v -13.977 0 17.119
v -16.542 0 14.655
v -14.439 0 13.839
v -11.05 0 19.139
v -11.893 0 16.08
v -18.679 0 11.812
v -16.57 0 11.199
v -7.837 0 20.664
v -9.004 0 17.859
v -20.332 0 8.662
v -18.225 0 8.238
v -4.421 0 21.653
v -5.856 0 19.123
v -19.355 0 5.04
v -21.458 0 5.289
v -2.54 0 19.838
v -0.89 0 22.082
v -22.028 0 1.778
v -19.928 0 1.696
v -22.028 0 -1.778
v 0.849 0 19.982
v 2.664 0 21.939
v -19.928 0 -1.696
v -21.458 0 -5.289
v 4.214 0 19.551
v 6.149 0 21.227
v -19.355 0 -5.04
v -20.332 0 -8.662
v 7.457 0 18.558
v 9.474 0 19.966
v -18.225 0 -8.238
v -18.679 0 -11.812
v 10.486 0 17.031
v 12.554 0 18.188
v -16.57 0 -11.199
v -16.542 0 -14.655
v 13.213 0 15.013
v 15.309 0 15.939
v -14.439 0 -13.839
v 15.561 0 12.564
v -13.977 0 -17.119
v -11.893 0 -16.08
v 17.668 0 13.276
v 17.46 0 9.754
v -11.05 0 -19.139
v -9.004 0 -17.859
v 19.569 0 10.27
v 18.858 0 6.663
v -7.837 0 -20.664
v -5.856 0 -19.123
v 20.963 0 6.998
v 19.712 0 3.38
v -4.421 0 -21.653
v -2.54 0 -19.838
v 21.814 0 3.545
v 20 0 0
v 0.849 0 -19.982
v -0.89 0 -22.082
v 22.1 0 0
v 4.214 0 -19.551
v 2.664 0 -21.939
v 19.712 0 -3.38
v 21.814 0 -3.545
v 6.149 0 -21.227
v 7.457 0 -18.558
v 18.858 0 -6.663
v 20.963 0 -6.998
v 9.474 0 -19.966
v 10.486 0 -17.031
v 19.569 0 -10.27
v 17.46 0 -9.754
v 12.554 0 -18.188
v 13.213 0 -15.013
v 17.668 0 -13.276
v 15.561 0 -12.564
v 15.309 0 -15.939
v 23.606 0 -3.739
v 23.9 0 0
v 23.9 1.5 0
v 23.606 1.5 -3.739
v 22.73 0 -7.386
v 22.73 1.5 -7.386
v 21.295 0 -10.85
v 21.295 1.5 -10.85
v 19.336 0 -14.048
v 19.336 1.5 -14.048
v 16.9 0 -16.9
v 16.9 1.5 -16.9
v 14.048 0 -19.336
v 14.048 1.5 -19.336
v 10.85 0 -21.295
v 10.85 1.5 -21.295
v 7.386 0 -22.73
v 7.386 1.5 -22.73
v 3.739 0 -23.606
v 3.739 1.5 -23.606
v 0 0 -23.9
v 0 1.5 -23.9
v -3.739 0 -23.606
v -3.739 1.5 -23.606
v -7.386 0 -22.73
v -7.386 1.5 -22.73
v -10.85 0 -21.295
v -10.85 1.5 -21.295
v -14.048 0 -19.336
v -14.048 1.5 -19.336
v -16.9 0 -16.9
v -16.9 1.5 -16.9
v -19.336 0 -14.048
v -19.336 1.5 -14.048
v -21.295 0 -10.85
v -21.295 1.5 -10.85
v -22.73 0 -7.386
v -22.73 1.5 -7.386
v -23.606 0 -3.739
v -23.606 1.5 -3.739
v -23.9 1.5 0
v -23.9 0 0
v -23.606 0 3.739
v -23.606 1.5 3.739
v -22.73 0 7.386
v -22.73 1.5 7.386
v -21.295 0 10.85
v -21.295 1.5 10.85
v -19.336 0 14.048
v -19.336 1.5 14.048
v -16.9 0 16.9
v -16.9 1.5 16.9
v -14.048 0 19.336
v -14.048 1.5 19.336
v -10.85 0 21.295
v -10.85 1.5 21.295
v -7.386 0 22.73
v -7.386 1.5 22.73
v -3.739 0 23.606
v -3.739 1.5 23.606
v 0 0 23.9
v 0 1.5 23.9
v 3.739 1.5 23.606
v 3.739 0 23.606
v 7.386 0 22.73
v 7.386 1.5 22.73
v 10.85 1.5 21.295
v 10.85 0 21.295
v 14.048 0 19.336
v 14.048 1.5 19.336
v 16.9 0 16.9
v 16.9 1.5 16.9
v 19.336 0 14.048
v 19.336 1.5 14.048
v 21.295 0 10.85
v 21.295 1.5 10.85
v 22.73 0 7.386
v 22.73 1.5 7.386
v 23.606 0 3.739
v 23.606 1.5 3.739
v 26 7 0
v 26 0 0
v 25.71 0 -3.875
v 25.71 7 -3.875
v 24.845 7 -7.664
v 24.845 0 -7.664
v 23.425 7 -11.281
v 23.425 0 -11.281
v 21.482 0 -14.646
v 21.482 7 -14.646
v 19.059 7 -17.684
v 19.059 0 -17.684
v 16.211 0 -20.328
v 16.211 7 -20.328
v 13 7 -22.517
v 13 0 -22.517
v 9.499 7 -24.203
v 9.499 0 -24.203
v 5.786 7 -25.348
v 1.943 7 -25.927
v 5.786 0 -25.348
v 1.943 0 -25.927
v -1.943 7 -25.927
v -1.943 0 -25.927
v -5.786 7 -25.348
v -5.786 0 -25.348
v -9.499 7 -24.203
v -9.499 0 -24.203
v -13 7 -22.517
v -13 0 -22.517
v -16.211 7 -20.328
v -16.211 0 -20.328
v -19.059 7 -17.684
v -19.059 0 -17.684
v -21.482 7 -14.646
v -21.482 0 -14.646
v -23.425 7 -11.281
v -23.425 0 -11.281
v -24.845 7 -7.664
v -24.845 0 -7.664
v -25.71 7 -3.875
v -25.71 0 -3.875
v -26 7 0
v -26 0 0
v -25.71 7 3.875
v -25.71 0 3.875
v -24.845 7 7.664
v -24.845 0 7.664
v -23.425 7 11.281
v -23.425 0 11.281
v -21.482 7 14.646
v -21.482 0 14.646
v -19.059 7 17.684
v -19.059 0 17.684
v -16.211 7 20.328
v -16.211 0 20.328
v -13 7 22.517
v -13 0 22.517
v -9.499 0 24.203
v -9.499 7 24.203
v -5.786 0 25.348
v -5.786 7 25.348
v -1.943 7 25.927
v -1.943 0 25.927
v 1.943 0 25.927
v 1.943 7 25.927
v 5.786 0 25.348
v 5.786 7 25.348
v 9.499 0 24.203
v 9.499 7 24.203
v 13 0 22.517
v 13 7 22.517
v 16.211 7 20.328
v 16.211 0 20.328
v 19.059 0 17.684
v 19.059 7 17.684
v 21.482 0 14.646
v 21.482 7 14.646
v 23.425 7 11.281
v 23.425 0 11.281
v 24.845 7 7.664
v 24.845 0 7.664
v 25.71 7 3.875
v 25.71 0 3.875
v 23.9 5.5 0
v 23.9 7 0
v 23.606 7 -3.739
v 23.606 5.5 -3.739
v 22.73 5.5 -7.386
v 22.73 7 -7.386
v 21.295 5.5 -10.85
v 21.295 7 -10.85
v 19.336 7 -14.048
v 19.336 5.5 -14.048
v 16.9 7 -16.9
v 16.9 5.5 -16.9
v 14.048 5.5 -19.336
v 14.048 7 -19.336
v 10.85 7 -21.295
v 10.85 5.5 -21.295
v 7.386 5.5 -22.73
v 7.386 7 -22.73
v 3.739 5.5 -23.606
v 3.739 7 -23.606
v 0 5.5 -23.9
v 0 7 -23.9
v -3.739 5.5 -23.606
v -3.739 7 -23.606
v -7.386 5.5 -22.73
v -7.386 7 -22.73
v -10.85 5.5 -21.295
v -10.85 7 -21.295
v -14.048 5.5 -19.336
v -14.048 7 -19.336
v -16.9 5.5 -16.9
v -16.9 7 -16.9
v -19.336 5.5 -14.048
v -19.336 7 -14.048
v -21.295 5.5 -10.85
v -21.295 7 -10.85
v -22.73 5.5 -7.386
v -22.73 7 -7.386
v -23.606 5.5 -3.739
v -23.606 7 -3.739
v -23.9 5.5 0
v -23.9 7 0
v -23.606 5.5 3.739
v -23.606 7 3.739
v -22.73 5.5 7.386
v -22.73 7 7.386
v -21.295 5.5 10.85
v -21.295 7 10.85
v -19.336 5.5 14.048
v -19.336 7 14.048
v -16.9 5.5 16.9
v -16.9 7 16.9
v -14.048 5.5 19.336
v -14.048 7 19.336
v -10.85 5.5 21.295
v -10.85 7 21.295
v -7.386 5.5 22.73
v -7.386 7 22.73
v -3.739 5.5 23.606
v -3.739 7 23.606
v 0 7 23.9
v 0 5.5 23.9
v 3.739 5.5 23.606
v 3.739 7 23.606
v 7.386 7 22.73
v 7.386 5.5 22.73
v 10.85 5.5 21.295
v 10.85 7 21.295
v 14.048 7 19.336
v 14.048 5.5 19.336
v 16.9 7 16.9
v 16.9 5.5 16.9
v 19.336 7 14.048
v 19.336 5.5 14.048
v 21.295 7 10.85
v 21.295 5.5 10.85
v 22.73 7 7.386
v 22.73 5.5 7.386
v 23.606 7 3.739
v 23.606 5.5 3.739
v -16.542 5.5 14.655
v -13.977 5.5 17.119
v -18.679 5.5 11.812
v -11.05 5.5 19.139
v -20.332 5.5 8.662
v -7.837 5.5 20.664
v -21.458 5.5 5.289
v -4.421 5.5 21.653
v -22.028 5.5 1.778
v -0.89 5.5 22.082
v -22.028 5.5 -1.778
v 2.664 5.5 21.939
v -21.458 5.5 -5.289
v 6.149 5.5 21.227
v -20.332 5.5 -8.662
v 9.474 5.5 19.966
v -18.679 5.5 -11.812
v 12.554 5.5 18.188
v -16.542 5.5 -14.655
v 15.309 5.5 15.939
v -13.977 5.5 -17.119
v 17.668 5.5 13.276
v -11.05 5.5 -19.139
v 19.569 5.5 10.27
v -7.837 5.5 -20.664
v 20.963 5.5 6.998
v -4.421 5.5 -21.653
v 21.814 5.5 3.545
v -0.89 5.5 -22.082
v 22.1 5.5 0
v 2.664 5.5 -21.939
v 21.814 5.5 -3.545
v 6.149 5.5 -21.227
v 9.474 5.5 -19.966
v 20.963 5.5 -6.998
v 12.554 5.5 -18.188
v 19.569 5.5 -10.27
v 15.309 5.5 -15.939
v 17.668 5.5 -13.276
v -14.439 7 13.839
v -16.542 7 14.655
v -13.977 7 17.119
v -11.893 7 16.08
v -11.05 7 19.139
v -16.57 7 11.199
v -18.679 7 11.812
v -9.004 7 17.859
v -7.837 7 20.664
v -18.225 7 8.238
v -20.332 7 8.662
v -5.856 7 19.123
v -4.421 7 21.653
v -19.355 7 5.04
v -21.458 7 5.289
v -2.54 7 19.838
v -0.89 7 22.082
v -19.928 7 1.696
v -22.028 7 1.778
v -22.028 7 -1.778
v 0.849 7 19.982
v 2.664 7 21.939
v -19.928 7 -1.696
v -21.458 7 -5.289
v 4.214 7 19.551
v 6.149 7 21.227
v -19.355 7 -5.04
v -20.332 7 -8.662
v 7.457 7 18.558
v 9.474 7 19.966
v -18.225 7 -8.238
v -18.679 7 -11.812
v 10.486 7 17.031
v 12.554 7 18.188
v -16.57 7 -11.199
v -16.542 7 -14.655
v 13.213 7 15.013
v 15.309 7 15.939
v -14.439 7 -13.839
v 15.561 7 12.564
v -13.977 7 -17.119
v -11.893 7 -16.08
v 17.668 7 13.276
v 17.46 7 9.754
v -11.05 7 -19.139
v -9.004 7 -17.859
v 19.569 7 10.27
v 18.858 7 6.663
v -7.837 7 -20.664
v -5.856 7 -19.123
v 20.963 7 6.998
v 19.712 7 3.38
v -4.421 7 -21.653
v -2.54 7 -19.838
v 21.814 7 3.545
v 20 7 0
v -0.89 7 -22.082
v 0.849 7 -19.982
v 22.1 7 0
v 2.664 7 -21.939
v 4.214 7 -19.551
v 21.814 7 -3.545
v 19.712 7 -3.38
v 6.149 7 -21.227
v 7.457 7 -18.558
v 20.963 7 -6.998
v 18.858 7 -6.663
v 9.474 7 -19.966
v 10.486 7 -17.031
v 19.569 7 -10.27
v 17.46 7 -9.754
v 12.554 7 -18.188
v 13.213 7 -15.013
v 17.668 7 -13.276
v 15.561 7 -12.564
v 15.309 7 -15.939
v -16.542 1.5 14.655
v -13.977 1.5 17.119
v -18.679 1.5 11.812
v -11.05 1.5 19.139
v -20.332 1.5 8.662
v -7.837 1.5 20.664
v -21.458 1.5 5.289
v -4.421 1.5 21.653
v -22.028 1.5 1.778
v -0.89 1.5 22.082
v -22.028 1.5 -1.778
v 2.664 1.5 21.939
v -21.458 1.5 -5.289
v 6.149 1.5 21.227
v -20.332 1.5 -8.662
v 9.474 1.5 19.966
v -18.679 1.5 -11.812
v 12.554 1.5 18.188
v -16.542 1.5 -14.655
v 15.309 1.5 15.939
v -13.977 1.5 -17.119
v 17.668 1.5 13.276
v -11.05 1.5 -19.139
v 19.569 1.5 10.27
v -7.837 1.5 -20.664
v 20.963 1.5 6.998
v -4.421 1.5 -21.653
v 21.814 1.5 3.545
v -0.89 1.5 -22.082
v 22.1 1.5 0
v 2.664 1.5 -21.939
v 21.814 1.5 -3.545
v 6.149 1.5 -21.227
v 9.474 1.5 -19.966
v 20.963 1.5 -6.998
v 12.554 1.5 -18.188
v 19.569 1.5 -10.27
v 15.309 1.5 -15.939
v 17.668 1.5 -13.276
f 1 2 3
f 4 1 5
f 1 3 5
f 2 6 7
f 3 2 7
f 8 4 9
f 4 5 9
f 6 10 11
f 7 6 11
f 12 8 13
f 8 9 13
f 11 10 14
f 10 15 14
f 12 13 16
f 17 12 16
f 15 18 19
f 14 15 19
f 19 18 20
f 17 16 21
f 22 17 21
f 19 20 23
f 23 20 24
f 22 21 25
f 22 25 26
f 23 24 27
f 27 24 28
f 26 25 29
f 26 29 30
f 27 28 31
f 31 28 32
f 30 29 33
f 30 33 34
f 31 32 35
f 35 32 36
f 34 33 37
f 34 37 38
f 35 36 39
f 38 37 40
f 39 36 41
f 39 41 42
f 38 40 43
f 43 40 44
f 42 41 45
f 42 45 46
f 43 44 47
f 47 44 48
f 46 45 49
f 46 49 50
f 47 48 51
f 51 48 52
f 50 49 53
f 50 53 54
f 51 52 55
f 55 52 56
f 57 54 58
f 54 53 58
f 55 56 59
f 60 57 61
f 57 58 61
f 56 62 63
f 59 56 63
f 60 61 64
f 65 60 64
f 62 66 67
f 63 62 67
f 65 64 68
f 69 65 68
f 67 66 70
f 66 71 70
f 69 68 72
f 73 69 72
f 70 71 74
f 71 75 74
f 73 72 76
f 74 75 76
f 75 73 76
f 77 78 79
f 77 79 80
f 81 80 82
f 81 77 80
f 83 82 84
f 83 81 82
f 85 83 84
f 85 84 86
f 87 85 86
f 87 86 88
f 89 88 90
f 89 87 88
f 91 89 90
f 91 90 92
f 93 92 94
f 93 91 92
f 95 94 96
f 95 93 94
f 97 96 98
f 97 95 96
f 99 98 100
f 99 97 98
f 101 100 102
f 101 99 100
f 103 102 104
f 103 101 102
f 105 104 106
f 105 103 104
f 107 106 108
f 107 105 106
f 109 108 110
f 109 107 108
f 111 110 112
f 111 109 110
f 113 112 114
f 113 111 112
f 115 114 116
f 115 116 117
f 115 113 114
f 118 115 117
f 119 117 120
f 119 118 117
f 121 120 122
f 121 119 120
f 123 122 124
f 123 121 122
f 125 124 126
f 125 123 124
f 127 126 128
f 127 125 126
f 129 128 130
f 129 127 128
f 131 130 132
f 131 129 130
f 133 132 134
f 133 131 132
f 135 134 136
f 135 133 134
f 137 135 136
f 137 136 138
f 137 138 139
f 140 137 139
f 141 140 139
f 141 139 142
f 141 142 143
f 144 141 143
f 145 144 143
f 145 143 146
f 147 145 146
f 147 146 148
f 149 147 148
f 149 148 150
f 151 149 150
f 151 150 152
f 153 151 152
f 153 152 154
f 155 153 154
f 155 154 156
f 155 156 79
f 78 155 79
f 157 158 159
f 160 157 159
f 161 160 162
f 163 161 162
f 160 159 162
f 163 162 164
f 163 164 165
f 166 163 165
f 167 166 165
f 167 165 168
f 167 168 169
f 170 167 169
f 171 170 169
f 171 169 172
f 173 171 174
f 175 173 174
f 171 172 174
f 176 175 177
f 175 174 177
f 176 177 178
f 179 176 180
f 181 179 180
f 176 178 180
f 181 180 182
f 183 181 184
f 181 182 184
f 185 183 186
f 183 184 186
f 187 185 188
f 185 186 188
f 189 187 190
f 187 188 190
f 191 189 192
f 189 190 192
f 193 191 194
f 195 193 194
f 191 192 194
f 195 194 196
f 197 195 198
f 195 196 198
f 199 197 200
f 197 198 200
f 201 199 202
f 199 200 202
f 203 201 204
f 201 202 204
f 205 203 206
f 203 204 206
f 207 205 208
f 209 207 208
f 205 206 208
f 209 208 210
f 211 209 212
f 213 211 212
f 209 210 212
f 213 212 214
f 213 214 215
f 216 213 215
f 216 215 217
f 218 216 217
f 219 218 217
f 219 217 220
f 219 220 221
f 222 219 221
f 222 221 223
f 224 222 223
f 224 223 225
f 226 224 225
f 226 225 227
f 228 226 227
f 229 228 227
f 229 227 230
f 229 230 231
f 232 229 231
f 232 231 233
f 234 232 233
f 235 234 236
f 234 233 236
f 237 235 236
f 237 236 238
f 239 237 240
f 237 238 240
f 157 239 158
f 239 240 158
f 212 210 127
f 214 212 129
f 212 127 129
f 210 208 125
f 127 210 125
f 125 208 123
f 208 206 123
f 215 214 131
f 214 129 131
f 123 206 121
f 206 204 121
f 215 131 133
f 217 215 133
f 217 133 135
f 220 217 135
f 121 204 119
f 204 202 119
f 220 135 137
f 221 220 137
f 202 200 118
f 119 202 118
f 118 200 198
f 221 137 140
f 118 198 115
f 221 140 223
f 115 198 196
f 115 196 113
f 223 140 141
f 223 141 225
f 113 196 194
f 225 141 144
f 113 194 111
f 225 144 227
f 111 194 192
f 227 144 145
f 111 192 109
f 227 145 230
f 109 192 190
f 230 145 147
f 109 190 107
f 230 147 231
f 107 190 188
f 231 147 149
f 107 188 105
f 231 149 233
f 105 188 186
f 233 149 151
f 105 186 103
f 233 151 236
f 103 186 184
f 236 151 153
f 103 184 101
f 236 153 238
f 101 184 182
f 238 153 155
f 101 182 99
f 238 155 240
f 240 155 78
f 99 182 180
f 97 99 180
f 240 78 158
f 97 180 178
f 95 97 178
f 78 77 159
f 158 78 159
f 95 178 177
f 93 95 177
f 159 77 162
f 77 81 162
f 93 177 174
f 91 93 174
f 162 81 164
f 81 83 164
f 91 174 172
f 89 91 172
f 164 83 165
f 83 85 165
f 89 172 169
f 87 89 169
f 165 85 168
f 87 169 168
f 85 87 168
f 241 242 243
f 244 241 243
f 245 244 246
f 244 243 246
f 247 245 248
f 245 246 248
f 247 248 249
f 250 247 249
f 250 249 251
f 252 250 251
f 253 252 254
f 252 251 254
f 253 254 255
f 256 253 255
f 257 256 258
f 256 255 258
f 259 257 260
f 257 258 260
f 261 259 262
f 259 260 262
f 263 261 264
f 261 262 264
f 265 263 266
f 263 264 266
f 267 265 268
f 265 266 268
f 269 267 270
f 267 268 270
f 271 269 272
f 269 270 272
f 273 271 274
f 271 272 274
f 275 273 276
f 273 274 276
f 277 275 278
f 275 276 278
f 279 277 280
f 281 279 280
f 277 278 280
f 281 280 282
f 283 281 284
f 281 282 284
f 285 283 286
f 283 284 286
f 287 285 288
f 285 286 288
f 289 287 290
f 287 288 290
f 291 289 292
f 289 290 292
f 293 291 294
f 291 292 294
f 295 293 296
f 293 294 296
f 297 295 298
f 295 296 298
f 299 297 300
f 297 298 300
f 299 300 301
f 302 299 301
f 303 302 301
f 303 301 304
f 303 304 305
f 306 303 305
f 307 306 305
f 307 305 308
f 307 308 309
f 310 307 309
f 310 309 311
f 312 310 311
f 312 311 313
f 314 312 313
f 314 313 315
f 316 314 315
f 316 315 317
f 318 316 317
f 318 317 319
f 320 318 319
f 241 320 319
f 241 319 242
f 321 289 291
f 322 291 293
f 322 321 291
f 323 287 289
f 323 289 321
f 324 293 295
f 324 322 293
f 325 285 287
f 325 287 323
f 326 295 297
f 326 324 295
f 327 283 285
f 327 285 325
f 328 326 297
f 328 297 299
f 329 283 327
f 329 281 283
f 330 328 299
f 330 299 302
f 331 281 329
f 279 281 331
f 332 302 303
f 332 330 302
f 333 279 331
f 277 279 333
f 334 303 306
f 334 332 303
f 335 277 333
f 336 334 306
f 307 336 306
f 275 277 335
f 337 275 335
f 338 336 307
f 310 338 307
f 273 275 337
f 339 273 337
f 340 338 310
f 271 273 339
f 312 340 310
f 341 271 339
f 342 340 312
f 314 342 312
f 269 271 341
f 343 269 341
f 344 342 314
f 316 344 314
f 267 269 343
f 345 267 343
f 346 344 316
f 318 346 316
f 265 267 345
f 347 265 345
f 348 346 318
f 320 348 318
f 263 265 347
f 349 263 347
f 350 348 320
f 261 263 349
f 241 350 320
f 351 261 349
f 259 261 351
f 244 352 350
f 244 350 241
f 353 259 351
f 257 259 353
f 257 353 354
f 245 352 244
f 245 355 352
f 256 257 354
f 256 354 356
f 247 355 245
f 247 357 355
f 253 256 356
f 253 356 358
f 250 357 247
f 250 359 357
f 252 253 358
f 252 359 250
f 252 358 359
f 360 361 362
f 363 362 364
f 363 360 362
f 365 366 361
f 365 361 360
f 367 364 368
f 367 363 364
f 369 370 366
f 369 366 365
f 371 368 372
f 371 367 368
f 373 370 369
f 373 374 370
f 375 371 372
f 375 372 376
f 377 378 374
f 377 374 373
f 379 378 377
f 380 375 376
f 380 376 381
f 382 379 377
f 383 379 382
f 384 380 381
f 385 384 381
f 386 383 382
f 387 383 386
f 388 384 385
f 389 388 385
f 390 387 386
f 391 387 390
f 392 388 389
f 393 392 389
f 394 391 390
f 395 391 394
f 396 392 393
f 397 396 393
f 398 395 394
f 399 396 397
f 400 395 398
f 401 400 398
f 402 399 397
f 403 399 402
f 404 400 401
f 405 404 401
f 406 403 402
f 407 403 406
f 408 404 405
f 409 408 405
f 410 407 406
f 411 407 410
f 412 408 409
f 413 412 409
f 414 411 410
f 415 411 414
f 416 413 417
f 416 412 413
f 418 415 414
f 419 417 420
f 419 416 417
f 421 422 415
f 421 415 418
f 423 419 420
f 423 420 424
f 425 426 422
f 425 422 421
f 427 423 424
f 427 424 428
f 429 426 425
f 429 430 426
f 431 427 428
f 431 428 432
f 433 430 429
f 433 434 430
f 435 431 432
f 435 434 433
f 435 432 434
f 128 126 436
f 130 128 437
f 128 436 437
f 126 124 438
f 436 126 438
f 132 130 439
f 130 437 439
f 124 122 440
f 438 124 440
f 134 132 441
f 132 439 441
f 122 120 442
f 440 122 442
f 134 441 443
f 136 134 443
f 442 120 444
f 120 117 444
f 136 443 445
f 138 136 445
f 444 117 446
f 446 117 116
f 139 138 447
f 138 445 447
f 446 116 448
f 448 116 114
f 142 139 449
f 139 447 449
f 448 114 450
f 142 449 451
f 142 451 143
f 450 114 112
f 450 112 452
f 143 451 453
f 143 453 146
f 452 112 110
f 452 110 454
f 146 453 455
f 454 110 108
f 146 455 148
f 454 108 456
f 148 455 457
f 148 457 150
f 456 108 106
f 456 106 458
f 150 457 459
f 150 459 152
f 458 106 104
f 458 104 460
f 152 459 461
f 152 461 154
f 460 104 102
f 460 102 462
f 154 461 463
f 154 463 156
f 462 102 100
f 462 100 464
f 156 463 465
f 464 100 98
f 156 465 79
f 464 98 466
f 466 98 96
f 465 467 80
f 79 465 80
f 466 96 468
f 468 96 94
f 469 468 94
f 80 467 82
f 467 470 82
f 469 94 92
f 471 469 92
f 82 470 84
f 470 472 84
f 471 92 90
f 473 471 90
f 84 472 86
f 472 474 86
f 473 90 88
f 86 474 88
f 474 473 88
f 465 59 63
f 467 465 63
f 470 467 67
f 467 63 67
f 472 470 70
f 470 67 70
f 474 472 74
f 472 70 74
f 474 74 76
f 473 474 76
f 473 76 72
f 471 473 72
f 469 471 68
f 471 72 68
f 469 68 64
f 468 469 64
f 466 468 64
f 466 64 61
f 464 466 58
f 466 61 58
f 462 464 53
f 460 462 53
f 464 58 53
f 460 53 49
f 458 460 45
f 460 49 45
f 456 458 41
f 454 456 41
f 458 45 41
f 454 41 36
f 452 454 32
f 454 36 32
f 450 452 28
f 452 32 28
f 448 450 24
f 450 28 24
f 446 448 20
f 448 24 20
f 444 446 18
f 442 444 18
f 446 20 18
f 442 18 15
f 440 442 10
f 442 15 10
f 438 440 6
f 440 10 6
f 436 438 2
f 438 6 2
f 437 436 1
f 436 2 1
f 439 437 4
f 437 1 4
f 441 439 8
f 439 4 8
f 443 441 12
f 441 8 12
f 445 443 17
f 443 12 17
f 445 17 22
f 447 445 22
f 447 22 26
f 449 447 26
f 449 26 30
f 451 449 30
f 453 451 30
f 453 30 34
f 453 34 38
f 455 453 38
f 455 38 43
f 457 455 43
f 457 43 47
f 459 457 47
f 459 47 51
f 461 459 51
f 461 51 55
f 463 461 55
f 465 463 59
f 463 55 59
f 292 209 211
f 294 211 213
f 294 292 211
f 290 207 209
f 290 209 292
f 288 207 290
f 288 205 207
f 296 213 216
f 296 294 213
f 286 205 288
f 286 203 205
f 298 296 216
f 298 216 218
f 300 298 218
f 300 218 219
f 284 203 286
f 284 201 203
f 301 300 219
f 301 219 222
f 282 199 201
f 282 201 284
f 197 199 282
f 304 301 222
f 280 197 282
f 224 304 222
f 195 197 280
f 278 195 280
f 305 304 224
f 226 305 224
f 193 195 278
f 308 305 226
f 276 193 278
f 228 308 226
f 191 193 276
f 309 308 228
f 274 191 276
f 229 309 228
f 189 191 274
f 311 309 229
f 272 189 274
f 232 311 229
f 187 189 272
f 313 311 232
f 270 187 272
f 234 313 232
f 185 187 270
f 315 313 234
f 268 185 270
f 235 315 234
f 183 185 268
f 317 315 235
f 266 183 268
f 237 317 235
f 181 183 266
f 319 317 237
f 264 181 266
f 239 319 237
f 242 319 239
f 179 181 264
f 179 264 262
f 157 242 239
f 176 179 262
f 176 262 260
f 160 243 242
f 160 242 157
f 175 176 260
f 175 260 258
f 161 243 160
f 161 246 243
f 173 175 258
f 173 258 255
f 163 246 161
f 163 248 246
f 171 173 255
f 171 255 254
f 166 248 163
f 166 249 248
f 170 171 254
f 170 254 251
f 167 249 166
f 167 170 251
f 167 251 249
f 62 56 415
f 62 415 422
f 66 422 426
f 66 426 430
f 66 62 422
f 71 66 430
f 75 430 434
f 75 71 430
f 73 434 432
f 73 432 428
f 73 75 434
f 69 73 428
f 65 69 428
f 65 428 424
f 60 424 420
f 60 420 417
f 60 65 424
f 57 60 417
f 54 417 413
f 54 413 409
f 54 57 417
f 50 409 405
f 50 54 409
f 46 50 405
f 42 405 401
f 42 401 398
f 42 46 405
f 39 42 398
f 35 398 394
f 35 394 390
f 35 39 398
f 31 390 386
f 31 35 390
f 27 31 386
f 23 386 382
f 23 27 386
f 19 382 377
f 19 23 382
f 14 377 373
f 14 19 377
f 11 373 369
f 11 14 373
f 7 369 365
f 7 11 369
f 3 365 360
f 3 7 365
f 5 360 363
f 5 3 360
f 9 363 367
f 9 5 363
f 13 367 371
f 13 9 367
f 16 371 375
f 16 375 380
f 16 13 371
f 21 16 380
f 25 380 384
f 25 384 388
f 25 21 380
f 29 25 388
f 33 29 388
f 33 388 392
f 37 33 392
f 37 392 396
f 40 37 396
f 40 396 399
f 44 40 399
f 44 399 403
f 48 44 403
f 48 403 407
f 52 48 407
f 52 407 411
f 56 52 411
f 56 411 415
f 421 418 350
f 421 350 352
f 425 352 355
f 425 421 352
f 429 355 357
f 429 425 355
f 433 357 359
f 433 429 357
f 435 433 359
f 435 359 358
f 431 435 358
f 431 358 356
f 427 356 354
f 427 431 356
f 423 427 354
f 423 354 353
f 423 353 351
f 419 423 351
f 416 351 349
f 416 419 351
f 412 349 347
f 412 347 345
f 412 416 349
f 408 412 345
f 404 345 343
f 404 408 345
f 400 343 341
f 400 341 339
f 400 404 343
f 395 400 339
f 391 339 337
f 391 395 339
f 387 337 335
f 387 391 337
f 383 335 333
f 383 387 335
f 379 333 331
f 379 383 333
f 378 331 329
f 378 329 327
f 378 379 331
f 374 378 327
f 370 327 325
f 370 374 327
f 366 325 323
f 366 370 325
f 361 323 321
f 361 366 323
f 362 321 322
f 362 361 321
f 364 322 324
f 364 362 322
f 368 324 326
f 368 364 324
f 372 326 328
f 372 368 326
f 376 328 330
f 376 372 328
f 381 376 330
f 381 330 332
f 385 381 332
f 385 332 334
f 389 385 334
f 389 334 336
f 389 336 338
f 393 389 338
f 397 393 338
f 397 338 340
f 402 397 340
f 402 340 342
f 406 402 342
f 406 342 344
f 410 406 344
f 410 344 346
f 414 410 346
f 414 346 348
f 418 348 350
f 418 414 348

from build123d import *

# Parameters (mm, degrees)
SKETCH_1_R          = 26
SKETCH_1_R_2        = 20
EXTRUDE_1_DEPTH     = 7
SKETCH_2_R          = 23.9
SKETCH_2_R_2        = 22.1
CUT_EXTRUDE_1_DEPTH = 1.5


with BuildPart() as part:
    # 草图1 → 凸台-拉伸1 (new body)
    with BuildSketch(Plane(origin=(0, 0, 0), x_dir=(1, 0, 0), z_dir=(0, 1, 0))):
        Circle(SKETCH_1_R)
        Circle(SKETCH_1_R_2, mode=Mode.SUBTRACT)
    extrude(amount=EXTRUDE_1_DEPTH)

    # 草图2 → 切除-拉伸1 (cut)
    with BuildSketch(Plane(origin=(0, 7, 0), x_dir=(1, 0, 0), z_dir=(0, 1, 0))):
        Circle(SKETCH_2_R)
        Circle(SKETCH_2_R_2, mode=Mode.SUBTRACT)
    cut_extrude_1 = extrude(amount=-CUT_EXTRUDE_1_DEPTH, mode=Mode.SUBTRACT)

    # 镜向1: 切除-拉伸1 across plane
    add(cut_extrude_1.mirror(Plane.ZX.offset(3.5)), mode=Mode.SUBTRACT)


solid = part.part
